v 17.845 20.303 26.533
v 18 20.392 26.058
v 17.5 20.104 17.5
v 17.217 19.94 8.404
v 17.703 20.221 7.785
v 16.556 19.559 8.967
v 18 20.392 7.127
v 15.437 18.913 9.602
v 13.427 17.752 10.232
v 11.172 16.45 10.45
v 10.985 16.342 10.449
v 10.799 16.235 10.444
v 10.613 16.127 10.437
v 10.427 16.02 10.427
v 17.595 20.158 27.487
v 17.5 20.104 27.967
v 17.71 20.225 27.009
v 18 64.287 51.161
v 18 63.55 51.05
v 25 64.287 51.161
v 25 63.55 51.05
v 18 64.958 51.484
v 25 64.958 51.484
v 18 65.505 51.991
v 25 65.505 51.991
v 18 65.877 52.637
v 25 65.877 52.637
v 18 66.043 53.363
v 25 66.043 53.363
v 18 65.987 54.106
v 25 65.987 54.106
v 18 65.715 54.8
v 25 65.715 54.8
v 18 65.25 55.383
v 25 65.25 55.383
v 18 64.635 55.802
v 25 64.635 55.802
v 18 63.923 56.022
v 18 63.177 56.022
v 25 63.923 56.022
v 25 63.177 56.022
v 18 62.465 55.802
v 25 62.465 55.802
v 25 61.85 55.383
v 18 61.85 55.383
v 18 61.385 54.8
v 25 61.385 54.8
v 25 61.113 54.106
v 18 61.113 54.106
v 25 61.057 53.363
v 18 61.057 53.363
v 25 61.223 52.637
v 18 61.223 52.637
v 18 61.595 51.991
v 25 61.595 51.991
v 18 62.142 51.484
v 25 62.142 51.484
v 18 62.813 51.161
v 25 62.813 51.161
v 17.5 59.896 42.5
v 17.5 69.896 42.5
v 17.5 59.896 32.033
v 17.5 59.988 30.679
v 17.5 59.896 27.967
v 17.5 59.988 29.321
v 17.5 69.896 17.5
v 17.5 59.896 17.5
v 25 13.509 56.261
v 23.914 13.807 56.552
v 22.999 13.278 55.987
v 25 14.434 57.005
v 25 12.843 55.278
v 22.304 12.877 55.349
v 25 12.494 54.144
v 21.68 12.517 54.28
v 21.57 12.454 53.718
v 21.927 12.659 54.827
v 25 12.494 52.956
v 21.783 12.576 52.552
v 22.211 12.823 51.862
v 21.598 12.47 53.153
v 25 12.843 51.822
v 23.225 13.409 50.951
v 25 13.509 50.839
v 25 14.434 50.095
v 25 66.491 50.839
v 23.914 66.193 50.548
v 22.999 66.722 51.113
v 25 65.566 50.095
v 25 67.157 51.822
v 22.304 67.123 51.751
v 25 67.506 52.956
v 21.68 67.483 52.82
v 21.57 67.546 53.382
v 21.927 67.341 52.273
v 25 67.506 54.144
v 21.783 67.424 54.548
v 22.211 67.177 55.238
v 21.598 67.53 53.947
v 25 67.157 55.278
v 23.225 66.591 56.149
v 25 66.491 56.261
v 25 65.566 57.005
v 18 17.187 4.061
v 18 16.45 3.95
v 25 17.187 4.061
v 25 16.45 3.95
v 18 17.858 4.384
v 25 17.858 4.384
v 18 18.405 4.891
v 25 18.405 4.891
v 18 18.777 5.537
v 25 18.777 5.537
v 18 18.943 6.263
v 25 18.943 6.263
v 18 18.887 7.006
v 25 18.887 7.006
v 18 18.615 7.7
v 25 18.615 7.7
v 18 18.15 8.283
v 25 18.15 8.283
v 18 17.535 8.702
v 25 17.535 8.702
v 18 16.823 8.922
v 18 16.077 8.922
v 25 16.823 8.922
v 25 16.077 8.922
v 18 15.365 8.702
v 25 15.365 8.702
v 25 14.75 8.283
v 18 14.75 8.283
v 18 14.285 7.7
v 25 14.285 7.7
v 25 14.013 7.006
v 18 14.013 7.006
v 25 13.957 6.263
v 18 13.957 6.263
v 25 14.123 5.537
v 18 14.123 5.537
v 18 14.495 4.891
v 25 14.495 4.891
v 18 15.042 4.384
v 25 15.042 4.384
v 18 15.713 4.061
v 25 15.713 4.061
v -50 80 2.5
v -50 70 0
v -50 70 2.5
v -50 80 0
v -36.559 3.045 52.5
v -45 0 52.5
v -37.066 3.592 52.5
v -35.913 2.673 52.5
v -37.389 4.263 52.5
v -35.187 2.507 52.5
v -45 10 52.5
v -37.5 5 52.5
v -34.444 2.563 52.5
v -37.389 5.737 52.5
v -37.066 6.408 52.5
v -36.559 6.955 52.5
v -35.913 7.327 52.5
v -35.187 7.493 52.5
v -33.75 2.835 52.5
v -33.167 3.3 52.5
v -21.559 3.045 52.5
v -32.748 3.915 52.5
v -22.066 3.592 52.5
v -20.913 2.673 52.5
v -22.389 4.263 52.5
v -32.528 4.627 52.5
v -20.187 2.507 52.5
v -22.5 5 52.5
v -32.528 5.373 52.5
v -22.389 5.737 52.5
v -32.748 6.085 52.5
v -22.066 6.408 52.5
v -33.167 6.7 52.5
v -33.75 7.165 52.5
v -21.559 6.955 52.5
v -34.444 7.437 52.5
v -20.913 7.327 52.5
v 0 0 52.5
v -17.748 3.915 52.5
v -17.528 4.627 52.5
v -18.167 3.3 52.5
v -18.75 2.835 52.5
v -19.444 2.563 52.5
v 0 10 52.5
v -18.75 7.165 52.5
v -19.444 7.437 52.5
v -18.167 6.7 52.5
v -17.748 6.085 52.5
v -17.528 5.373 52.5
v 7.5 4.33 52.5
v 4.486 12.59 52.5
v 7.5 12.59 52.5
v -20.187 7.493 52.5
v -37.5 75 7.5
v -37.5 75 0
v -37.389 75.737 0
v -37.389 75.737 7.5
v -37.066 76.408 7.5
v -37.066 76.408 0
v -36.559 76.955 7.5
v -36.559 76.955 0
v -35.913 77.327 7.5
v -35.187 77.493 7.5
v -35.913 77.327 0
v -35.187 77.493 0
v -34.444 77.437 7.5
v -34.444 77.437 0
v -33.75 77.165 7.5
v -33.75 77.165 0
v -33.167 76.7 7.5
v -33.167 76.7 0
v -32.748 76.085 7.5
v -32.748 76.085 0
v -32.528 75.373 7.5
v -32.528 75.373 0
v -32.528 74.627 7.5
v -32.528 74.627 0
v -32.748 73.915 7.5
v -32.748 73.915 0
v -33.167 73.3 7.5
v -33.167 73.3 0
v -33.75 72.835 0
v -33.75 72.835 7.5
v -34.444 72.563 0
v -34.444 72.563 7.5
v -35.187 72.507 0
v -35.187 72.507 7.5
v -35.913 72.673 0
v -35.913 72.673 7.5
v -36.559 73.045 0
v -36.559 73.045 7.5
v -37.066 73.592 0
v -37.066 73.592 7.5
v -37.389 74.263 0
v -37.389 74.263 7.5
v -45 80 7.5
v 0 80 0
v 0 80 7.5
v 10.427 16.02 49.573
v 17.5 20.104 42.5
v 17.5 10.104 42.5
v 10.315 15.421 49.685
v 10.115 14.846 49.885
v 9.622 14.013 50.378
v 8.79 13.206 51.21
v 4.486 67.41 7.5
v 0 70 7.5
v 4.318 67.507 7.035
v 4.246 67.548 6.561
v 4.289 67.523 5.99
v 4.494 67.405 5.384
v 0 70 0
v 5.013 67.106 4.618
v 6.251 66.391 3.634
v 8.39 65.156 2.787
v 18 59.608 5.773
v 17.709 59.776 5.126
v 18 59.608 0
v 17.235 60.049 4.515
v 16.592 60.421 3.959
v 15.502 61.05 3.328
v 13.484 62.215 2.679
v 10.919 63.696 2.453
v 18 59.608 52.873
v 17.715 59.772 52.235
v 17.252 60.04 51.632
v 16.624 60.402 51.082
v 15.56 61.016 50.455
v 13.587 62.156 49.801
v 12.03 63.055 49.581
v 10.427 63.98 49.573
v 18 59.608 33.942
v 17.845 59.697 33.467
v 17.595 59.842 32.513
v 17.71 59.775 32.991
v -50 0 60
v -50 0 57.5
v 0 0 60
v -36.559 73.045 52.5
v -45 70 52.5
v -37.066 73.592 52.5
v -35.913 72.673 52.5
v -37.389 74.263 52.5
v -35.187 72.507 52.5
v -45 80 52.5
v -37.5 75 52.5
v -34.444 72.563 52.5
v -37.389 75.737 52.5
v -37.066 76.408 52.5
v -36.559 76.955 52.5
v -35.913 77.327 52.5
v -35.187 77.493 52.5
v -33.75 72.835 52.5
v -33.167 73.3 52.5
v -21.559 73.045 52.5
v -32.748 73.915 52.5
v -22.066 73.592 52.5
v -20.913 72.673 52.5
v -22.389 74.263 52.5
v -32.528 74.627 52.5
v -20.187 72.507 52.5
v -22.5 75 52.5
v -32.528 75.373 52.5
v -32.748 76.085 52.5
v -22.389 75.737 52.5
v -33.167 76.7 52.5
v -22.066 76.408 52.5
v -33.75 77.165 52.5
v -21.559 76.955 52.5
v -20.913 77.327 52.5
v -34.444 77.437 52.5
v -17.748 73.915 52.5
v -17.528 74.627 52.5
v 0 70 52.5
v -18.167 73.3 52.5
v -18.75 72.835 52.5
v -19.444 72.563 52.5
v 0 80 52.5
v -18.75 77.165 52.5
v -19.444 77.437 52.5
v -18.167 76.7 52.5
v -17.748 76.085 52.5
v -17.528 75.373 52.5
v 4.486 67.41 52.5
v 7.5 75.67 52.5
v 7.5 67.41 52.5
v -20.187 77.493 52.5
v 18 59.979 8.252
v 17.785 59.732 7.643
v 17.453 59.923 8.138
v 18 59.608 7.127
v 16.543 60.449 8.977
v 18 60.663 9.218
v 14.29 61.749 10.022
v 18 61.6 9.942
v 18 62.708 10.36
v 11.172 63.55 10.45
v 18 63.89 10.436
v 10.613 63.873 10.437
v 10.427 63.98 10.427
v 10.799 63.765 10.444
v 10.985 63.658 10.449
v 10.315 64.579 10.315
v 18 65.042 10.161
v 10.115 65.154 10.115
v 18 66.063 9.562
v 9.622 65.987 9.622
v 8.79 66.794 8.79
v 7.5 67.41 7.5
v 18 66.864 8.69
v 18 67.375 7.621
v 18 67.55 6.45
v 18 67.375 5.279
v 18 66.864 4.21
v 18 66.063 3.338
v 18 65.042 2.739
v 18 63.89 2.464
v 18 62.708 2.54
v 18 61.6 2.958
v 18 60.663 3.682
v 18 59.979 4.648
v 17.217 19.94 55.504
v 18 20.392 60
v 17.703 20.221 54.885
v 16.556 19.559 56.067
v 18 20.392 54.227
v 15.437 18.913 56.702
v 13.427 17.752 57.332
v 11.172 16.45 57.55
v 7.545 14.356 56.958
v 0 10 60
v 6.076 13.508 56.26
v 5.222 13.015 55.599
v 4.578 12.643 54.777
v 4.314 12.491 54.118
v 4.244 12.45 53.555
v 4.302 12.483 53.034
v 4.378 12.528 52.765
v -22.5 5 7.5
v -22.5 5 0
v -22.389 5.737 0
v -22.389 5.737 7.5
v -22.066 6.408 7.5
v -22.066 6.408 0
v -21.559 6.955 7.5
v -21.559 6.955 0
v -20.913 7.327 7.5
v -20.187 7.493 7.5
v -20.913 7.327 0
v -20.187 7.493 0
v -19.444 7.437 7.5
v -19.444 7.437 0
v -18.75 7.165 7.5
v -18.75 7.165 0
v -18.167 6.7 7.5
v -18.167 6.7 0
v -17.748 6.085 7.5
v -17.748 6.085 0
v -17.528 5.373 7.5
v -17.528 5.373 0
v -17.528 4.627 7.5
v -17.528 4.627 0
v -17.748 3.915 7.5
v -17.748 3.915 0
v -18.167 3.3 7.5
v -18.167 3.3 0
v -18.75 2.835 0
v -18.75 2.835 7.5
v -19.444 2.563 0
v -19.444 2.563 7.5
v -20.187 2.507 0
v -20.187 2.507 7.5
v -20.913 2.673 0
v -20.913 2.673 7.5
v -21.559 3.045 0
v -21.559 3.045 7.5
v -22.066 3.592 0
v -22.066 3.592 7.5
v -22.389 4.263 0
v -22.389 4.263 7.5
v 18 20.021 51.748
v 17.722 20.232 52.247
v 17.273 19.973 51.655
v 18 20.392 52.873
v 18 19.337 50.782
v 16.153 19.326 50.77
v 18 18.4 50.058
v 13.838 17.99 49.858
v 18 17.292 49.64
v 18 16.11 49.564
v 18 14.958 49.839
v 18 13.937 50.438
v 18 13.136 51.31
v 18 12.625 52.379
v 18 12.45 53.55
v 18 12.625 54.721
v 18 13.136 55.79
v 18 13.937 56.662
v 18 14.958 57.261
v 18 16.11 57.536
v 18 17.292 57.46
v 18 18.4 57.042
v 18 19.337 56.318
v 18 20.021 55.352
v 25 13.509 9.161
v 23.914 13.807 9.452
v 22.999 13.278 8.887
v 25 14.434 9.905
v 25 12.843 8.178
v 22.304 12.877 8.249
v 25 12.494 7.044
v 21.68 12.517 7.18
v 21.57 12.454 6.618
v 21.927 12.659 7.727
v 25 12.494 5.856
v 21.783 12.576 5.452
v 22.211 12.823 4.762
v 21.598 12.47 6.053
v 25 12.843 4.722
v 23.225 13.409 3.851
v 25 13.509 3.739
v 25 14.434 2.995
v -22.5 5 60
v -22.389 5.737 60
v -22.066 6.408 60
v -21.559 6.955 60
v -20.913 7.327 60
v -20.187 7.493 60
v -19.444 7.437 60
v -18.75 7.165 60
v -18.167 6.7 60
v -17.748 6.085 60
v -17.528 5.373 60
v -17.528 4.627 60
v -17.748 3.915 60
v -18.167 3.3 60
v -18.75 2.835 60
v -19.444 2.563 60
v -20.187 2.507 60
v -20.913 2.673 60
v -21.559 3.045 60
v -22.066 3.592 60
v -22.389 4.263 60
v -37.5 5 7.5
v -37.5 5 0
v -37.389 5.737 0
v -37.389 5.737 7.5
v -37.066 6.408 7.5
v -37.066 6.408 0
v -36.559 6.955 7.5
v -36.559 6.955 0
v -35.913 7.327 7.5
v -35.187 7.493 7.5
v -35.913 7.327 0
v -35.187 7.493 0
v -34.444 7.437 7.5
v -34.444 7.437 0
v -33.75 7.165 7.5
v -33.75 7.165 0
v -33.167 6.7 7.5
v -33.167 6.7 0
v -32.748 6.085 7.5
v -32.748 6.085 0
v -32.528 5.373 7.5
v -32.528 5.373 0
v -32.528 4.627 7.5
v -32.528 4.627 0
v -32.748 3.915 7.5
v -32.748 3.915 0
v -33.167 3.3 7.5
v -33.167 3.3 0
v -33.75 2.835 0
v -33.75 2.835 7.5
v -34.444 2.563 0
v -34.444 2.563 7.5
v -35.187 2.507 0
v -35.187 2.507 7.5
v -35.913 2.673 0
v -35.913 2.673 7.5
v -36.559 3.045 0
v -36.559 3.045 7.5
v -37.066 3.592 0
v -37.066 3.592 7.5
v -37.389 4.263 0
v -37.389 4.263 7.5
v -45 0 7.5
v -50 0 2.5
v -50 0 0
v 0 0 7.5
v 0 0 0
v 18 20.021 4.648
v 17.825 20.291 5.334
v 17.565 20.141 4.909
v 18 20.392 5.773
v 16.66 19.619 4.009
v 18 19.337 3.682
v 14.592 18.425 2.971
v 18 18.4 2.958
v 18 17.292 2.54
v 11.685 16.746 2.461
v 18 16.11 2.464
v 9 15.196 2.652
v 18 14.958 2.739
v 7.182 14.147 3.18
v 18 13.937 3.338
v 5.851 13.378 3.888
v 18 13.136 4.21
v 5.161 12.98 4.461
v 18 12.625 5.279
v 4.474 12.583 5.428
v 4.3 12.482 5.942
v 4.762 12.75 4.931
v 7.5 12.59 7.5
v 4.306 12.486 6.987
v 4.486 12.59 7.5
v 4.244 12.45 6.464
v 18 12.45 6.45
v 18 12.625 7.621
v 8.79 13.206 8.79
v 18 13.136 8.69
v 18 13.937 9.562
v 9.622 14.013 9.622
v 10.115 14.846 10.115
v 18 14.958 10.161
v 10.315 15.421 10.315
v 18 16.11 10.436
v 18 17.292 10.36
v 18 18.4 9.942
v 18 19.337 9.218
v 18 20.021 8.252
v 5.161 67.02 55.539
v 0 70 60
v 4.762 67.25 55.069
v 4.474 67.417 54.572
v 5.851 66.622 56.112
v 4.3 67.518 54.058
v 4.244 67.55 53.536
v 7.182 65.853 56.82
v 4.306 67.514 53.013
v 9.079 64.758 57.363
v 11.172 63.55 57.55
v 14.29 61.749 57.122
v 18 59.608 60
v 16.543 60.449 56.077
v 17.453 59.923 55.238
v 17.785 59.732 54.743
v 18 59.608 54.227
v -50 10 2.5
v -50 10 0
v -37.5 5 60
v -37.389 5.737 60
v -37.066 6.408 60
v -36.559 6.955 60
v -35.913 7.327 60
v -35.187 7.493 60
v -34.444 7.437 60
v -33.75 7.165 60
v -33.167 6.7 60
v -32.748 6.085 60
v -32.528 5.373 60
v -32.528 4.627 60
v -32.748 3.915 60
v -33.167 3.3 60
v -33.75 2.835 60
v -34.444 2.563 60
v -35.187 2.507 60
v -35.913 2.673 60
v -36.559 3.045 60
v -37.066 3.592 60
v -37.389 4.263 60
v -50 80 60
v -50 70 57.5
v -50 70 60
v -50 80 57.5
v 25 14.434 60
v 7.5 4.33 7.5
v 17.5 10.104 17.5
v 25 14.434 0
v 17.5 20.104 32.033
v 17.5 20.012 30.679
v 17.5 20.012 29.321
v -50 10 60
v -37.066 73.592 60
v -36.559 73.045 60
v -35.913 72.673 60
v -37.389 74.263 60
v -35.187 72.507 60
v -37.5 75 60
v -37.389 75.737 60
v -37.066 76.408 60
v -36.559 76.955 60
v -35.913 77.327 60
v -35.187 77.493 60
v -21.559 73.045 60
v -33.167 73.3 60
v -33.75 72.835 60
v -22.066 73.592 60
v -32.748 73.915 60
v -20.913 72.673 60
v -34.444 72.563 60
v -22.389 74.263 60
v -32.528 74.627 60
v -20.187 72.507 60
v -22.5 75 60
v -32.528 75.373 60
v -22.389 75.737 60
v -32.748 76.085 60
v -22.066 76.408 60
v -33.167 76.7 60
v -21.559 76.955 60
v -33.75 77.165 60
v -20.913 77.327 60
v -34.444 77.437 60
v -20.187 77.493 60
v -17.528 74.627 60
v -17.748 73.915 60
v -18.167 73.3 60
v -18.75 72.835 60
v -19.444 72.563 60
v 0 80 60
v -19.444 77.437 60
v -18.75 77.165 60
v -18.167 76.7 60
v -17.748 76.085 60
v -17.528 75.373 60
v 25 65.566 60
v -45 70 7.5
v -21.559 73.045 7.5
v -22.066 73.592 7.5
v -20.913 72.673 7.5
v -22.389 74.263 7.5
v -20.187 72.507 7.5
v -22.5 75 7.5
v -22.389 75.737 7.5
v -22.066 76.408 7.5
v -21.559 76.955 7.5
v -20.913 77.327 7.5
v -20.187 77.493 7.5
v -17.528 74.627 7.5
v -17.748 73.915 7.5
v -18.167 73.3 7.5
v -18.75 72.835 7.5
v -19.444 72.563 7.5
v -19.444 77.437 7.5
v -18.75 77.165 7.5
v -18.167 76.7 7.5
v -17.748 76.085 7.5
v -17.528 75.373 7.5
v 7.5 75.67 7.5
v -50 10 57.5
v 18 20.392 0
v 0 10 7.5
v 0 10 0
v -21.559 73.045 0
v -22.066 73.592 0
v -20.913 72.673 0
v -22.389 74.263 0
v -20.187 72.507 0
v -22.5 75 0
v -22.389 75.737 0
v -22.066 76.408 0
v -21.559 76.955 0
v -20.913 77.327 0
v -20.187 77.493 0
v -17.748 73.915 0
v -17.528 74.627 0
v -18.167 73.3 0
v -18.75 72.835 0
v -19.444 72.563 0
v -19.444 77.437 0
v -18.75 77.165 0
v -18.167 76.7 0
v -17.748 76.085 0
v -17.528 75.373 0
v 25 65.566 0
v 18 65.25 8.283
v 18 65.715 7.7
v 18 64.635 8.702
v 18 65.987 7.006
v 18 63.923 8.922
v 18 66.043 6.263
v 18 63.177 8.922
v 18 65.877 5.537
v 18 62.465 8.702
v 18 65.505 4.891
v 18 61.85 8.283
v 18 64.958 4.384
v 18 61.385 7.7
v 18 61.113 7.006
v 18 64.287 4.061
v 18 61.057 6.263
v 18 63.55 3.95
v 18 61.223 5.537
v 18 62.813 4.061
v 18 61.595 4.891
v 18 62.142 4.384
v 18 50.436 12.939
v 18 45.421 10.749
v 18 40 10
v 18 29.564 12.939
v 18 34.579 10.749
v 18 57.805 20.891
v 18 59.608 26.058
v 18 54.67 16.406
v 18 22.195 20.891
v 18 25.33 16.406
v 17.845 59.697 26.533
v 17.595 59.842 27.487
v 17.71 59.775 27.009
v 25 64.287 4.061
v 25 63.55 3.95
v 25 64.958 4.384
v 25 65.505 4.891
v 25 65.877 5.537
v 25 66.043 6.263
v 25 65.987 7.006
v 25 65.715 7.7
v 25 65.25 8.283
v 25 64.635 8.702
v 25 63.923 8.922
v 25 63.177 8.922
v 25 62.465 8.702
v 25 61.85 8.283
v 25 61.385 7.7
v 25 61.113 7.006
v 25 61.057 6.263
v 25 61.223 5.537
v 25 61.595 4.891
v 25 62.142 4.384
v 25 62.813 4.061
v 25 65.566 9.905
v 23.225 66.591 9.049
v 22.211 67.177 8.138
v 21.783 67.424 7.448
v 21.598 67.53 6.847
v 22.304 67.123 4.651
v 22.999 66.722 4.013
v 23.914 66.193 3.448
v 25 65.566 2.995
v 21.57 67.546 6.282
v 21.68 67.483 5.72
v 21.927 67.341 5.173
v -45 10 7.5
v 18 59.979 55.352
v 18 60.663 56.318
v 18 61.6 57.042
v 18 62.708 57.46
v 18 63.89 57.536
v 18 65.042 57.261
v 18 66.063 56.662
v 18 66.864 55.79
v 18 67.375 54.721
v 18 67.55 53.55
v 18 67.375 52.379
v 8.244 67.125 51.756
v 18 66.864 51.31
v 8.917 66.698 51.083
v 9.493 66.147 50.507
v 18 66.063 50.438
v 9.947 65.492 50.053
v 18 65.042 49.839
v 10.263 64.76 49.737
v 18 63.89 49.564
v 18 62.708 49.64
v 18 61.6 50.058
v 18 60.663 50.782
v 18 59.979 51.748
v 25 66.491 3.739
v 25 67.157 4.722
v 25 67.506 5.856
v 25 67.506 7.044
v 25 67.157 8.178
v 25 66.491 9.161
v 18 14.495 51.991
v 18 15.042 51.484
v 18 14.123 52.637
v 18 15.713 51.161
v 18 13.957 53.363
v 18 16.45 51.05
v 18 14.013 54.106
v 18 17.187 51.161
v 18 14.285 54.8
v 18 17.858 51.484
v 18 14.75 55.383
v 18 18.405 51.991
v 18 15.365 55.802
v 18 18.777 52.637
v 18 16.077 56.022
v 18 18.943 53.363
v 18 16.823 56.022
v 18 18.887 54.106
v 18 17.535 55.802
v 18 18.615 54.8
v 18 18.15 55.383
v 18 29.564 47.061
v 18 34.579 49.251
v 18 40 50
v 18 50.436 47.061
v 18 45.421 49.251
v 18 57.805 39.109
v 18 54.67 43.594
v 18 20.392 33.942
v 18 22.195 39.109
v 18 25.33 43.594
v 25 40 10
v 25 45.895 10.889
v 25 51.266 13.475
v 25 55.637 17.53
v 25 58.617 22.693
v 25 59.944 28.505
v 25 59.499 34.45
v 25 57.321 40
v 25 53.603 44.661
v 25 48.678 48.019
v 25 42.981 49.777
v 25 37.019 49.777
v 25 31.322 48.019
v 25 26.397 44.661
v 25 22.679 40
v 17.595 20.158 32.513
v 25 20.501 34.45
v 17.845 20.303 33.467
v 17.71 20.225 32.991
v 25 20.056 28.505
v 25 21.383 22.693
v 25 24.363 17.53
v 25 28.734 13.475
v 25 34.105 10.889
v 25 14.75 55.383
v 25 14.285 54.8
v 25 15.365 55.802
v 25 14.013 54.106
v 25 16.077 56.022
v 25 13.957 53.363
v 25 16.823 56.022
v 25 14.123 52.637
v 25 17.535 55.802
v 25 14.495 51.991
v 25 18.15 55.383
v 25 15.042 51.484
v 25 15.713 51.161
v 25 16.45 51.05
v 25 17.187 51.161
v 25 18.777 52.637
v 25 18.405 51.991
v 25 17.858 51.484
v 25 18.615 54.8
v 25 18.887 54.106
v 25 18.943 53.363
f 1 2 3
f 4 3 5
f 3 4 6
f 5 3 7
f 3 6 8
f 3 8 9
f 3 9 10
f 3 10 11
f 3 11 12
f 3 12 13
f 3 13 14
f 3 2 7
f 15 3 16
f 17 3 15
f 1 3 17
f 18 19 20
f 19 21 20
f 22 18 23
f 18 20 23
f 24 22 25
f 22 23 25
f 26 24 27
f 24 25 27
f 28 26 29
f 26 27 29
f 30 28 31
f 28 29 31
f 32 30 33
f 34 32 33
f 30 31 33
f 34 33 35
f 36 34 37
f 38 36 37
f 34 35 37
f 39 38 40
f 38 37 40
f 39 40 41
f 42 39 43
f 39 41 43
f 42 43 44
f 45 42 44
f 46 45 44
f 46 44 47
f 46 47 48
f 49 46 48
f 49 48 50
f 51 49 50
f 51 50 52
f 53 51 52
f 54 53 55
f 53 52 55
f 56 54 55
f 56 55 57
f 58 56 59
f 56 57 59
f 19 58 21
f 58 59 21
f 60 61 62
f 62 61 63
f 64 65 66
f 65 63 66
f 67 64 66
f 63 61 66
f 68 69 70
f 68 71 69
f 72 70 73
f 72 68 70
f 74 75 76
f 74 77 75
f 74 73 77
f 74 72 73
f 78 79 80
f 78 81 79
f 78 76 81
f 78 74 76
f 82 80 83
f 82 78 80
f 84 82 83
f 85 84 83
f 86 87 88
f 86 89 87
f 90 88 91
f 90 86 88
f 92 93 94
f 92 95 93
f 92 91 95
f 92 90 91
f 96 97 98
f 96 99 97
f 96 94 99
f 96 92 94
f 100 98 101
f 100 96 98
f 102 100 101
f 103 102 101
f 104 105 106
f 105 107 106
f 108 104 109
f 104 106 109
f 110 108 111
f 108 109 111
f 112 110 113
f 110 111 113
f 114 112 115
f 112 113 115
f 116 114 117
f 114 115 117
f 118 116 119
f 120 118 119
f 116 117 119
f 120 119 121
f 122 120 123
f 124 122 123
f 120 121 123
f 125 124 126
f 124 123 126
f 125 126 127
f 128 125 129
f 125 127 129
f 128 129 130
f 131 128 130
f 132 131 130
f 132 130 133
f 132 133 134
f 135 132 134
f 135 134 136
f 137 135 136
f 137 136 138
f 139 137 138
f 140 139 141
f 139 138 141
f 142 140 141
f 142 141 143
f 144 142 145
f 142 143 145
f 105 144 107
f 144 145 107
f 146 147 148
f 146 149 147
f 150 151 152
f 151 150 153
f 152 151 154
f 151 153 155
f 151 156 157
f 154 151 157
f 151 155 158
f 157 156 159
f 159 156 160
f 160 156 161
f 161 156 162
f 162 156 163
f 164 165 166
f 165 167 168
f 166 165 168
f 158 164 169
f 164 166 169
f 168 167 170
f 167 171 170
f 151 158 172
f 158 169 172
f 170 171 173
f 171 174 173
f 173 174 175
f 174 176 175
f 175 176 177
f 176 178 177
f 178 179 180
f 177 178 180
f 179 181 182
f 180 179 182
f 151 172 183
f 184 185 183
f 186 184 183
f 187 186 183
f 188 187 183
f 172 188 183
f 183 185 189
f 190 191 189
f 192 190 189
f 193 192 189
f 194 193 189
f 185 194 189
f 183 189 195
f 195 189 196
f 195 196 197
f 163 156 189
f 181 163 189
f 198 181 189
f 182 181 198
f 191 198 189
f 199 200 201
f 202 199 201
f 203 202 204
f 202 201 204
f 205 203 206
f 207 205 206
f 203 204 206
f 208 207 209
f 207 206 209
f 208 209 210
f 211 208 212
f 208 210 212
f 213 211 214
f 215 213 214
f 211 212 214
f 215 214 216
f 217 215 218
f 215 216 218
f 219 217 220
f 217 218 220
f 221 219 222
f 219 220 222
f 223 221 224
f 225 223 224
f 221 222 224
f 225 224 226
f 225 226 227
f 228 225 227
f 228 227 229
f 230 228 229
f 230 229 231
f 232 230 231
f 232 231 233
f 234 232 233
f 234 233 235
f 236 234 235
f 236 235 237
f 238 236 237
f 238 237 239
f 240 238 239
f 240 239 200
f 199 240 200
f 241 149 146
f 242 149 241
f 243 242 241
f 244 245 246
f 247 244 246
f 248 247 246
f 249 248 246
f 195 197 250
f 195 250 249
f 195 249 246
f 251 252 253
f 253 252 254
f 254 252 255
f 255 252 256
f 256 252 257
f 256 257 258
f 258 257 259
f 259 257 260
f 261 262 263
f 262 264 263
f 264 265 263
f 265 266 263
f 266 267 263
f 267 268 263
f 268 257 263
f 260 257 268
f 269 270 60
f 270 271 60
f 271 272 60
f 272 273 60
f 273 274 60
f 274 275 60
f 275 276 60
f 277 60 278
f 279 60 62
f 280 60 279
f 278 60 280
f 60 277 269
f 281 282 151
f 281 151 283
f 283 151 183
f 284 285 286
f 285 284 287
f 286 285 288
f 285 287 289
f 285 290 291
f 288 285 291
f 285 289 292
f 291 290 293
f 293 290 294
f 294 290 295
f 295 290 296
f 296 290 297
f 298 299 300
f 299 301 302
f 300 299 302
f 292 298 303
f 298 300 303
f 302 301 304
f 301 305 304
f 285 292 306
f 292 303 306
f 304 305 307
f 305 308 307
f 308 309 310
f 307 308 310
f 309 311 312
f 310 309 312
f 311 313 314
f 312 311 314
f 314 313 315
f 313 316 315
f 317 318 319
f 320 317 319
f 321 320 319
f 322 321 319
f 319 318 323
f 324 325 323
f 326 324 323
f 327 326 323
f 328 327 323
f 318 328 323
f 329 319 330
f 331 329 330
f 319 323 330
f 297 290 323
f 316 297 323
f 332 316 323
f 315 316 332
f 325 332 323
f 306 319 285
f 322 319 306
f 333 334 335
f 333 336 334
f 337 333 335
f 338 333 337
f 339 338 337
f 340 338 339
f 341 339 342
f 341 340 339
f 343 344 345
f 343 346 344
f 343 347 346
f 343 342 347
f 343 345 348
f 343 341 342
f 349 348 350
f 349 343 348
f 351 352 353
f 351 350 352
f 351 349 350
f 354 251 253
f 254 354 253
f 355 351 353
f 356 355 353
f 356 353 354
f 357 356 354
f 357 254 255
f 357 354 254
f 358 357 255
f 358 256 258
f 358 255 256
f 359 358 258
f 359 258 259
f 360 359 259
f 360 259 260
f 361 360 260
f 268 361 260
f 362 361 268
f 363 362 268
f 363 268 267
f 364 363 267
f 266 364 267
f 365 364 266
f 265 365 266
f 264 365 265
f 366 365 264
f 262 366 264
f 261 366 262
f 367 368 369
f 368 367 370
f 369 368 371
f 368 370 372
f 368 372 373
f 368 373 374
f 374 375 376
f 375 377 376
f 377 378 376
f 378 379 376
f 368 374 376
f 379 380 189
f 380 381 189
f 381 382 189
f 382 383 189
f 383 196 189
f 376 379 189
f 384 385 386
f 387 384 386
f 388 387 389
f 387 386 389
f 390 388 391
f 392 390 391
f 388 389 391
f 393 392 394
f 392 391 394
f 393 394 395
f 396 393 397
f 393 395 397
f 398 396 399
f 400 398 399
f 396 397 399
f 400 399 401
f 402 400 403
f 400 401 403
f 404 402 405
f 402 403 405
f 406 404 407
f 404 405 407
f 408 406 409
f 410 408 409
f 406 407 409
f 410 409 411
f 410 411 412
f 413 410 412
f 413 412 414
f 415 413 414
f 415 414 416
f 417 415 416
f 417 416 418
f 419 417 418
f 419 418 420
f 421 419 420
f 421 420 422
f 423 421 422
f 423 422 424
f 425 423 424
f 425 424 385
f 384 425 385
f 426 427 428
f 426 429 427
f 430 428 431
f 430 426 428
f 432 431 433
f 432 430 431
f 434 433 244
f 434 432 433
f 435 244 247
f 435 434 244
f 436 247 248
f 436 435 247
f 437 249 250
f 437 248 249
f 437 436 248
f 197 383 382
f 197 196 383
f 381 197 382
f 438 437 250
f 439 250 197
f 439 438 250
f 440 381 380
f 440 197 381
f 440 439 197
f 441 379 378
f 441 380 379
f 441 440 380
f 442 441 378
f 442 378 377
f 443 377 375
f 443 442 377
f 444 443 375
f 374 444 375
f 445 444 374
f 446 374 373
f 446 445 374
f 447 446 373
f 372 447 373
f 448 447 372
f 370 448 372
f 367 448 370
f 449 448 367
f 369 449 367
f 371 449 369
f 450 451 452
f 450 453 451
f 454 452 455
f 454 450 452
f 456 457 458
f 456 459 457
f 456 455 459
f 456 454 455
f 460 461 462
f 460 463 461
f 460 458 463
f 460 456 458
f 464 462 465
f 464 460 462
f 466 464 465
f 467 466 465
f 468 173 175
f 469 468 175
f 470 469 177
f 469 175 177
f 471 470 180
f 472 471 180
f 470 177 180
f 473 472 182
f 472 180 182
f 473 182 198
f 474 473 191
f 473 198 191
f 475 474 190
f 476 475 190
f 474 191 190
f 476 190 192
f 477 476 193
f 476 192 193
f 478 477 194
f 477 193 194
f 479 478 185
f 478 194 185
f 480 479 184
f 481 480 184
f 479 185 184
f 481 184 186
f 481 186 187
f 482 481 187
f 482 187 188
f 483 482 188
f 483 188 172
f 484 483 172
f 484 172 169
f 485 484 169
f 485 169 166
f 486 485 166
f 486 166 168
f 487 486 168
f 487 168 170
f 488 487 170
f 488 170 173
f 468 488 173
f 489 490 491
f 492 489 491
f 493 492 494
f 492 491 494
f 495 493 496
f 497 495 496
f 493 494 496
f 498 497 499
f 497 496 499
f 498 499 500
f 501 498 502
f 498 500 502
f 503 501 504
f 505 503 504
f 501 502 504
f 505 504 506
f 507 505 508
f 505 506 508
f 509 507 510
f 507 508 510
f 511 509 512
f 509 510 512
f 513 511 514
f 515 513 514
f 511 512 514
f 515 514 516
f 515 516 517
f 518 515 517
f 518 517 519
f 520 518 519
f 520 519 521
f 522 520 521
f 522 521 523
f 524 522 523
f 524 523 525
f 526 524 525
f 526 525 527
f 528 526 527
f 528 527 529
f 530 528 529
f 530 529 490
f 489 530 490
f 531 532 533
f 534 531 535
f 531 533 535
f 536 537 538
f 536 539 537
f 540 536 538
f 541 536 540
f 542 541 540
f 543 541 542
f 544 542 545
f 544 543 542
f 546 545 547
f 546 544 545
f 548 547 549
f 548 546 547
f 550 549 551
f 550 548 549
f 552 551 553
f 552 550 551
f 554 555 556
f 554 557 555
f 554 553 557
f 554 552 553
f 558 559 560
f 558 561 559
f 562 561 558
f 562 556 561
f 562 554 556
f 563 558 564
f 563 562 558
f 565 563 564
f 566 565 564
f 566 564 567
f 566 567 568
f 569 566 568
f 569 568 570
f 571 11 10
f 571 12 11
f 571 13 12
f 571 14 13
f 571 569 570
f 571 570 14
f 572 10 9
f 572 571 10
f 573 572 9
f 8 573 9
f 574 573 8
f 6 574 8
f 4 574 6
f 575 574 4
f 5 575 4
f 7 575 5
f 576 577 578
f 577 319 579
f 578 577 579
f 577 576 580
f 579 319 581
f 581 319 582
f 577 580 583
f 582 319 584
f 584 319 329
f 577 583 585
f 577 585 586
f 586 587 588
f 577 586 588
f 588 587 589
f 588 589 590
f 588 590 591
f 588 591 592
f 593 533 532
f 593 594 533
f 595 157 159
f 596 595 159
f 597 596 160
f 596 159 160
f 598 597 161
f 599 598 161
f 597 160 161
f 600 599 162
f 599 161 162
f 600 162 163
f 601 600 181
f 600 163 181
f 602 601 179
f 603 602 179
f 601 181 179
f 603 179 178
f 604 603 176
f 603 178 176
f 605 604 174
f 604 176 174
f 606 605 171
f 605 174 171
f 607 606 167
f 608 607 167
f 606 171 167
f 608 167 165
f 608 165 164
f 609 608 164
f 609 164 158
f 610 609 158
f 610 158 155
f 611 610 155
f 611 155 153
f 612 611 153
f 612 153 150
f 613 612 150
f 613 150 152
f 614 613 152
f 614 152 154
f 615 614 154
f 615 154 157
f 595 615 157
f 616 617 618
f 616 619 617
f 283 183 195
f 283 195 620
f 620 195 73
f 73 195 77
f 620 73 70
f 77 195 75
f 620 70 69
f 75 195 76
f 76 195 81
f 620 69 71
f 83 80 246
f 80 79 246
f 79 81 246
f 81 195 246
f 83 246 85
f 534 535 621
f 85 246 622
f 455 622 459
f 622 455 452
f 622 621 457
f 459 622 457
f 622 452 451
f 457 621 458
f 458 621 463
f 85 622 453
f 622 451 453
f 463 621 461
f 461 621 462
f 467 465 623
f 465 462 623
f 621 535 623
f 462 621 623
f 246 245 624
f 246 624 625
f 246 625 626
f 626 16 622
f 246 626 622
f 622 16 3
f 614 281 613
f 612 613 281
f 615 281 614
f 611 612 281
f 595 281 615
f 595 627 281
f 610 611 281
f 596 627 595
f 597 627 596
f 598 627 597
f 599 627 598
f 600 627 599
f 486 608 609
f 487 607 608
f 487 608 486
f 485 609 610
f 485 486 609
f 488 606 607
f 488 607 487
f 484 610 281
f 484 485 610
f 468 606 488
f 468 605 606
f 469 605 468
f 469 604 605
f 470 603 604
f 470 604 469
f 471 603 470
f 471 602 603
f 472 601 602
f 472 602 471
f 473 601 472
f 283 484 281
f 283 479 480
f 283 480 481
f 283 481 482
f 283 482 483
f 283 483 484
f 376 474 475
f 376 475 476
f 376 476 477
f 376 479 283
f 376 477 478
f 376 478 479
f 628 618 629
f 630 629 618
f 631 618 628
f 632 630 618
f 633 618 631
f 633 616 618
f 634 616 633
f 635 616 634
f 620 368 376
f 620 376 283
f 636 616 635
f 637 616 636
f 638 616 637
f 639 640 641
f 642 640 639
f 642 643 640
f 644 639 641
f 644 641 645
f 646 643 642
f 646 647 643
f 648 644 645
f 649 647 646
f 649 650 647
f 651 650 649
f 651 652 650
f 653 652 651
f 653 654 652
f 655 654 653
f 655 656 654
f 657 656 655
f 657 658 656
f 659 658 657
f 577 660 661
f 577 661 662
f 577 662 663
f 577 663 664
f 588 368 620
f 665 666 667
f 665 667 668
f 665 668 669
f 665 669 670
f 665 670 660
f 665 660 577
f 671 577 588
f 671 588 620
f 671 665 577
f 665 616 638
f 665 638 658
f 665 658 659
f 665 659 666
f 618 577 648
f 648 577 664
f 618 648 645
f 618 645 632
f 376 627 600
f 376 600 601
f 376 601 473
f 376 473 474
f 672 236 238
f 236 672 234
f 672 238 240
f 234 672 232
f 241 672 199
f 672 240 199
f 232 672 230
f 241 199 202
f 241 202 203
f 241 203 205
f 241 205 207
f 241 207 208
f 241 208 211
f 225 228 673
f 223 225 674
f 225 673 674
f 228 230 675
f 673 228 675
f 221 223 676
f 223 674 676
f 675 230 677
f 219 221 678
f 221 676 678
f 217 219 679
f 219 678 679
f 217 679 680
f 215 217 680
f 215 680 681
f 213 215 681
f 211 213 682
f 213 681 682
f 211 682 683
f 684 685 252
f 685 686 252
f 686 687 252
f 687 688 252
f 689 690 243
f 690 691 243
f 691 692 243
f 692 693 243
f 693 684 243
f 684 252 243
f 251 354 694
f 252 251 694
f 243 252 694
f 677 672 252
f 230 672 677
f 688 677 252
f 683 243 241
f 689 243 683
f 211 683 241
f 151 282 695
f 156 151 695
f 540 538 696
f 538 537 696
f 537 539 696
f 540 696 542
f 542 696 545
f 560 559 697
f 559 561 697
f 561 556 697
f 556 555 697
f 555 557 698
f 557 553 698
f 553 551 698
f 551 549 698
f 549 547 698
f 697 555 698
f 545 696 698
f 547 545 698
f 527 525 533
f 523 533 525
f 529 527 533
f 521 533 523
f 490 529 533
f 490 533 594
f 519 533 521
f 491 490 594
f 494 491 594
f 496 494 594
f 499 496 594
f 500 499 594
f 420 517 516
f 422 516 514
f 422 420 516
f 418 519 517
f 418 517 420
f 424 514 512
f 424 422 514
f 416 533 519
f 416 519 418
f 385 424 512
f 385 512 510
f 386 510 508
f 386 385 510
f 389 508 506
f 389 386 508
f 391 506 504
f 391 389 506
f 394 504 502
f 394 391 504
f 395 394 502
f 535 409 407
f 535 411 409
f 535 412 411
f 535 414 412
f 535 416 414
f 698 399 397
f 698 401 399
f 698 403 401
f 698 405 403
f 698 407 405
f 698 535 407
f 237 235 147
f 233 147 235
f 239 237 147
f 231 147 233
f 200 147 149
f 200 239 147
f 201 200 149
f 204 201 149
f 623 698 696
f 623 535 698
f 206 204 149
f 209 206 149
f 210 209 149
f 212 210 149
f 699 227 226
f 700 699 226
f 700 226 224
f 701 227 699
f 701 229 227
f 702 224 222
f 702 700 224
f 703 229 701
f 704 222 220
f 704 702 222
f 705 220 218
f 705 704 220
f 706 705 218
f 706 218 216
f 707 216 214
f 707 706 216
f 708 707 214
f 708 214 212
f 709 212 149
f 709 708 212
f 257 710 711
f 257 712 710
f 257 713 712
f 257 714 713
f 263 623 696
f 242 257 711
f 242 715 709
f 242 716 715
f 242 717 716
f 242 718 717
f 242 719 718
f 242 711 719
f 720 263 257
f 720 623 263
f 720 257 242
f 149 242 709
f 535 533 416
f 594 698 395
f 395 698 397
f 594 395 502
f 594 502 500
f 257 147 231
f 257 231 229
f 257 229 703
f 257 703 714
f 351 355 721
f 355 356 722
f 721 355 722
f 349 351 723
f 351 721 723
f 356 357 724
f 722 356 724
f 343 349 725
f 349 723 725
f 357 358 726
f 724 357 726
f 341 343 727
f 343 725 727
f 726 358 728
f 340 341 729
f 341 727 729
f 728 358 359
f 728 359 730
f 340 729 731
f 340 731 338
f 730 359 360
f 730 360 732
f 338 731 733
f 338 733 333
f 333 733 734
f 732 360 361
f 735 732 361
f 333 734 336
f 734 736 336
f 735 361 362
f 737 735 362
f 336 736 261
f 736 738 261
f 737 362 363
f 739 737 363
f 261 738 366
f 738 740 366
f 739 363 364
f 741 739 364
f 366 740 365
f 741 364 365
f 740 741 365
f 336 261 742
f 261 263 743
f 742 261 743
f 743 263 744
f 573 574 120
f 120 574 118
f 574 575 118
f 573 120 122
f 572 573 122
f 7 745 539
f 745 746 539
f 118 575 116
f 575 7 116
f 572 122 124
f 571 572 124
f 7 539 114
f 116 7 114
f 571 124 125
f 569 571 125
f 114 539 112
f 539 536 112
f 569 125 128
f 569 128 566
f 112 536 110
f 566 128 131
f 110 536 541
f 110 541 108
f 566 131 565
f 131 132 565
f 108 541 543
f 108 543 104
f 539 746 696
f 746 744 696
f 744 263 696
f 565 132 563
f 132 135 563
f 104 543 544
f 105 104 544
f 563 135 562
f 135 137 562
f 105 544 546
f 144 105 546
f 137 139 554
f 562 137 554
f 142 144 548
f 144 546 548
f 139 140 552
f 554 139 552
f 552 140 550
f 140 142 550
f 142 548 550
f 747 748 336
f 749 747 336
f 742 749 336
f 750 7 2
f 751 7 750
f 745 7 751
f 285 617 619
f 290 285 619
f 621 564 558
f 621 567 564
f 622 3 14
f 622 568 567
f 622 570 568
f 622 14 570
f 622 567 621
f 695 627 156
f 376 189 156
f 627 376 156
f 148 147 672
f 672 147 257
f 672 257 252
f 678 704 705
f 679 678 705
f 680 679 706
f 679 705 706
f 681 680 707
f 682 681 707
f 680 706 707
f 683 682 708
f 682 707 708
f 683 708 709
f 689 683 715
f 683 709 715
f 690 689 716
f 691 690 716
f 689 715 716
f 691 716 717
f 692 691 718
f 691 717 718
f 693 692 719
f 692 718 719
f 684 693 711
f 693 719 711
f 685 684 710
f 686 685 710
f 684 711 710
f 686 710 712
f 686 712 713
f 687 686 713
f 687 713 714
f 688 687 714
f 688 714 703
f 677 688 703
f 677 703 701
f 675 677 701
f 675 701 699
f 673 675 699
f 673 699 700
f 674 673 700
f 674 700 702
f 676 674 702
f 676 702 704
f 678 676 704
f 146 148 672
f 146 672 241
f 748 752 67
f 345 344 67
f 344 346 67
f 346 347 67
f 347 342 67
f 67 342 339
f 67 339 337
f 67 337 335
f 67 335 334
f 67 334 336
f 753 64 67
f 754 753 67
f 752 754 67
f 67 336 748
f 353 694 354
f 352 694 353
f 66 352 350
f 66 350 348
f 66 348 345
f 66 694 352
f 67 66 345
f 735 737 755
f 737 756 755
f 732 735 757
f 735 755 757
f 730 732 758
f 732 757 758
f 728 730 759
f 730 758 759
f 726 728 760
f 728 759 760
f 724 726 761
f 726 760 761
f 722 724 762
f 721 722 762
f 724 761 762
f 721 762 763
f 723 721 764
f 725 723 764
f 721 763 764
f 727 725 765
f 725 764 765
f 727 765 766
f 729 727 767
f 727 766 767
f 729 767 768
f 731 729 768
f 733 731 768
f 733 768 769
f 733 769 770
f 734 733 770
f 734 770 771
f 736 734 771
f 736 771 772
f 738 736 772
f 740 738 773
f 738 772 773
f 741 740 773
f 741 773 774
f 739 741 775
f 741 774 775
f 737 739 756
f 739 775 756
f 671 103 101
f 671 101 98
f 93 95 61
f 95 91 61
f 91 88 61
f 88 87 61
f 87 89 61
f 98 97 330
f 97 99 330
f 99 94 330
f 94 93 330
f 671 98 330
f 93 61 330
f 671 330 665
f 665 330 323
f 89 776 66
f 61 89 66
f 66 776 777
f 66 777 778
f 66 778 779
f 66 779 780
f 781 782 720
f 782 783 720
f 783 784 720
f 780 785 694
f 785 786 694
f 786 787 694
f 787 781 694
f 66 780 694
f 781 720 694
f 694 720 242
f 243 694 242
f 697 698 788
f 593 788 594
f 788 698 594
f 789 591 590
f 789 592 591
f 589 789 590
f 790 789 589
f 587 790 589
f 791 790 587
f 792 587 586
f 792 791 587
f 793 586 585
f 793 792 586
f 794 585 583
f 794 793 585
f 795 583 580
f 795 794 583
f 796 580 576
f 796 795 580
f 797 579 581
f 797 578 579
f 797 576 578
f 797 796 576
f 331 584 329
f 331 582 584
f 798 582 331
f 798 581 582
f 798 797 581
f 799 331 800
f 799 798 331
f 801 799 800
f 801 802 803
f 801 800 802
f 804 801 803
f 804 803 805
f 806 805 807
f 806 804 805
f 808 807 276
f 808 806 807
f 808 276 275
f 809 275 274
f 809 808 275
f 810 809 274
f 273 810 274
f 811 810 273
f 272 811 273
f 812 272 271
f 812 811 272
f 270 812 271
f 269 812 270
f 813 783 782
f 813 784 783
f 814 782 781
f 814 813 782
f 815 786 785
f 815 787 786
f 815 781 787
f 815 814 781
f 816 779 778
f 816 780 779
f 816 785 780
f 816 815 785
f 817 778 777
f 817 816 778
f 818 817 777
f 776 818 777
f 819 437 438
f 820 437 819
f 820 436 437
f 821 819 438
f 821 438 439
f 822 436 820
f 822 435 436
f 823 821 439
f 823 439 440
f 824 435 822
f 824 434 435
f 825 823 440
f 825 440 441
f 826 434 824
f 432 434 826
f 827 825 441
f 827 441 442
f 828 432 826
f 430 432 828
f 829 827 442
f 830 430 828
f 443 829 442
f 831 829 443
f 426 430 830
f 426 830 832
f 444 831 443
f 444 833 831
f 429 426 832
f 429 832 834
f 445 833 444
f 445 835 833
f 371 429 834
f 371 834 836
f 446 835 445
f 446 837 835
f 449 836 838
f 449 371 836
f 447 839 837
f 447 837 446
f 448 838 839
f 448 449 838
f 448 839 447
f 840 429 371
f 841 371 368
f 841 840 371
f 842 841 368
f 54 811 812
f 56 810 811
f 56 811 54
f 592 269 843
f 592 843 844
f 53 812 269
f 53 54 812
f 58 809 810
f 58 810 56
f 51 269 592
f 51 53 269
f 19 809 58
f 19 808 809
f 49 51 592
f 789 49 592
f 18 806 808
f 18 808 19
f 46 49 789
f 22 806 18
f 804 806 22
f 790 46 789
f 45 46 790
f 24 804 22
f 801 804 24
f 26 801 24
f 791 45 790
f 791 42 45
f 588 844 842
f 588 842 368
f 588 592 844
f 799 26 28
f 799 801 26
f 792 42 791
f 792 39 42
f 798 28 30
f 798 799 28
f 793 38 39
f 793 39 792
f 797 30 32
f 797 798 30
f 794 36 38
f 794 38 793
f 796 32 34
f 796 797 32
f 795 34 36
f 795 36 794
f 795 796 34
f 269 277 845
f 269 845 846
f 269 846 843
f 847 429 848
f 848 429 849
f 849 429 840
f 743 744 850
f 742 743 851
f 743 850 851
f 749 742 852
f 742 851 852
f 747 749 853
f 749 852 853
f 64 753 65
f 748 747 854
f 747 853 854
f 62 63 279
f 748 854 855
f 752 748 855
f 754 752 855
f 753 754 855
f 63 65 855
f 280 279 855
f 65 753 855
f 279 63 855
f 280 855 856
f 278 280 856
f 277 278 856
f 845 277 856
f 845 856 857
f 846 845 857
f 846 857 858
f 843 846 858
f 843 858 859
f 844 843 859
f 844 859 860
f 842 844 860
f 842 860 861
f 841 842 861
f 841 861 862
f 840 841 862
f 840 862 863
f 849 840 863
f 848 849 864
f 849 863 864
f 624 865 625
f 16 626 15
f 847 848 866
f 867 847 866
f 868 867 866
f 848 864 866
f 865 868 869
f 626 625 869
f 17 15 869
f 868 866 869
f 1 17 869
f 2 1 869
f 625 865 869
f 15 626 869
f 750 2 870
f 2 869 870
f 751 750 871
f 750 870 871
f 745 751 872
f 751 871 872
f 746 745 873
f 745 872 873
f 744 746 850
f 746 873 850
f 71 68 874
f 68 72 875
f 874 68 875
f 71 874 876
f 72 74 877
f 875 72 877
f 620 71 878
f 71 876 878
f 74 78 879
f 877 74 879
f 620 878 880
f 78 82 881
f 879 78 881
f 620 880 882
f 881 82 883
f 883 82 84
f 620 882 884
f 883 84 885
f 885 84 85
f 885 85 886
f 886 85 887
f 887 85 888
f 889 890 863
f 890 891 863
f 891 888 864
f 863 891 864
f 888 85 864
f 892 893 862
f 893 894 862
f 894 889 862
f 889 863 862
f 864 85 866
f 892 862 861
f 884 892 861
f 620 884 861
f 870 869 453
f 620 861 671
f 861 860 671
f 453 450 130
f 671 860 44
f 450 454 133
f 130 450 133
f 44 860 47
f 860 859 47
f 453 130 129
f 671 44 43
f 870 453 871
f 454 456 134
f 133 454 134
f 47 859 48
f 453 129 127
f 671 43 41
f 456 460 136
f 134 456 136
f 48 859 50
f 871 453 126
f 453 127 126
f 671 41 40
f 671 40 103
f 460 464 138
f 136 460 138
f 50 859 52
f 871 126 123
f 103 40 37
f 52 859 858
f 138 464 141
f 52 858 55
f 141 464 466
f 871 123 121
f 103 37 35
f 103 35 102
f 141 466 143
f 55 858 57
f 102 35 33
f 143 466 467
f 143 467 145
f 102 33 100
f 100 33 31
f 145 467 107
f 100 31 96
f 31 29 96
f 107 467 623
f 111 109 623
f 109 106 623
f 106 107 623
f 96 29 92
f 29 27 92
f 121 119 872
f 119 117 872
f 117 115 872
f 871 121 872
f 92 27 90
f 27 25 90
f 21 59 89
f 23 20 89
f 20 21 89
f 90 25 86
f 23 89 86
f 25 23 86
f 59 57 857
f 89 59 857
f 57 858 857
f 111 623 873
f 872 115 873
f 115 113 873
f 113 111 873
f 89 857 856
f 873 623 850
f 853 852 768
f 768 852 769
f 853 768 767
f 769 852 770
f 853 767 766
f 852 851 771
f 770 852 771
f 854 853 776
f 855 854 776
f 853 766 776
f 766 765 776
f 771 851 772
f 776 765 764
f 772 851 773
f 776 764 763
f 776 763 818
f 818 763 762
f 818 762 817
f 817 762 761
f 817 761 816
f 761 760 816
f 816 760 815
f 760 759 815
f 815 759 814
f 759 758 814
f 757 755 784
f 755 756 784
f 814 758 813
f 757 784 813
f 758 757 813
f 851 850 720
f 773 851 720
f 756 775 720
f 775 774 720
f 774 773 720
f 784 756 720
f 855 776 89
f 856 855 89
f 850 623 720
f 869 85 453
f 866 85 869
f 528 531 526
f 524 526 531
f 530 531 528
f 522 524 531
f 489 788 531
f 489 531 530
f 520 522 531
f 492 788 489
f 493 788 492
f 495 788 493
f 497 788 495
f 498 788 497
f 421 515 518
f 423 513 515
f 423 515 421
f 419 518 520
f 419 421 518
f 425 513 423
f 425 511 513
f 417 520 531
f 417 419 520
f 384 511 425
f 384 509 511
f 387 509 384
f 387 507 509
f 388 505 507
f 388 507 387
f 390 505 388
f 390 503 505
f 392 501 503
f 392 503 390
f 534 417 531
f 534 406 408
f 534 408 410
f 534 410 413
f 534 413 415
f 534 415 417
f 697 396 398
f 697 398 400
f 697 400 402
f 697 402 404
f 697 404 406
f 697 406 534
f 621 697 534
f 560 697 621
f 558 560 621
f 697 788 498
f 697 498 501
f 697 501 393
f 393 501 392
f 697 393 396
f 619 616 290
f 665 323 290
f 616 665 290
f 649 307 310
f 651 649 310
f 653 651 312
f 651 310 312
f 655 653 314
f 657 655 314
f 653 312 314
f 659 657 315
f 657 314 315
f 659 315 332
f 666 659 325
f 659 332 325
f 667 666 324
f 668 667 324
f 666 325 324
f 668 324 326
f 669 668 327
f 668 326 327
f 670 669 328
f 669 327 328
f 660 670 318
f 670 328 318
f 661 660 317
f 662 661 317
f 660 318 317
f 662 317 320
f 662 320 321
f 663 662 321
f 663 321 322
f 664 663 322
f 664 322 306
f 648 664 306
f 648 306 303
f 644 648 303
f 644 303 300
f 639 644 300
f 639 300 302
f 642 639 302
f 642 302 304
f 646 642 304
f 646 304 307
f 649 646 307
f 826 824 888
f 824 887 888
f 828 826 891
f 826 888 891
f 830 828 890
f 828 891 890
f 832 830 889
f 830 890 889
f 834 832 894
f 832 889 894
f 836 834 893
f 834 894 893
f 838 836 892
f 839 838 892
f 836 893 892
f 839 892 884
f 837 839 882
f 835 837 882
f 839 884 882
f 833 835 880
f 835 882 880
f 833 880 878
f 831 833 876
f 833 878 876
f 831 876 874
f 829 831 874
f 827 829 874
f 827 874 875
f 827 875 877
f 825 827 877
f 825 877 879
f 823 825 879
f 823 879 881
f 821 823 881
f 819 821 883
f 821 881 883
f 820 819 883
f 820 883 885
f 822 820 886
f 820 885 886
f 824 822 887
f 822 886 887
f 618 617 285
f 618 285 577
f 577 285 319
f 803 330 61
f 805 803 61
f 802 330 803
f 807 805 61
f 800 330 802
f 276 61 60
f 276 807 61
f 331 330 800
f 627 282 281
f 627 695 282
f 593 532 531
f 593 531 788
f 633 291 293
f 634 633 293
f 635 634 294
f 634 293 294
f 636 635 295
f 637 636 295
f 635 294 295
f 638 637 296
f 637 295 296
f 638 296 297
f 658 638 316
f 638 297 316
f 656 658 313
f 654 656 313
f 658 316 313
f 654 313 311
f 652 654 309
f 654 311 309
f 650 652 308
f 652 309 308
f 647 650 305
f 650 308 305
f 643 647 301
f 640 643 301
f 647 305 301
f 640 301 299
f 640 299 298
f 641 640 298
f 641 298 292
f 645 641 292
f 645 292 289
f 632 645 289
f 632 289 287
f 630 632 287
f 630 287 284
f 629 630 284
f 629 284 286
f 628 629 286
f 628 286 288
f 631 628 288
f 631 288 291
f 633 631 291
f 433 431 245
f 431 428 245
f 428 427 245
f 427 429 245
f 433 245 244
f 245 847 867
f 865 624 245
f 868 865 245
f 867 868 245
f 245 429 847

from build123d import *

# Parameters (mm, degrees)
BOSS_EXTRUDE1_DEPTH = 60
SKETCH2_W           = 115
SKETCH2_H           = 45
CUT_EXTRUDE1_DEPTH  = 81
SKETCH3_W           = 7.5
SKETCH3_H           = 10
BOSS_EXTRUDE2_DEPTH = 10
CHAMFER1_SIZE       = 5
SKETCH4_R           = 2.5
CUT_EXTRUDE2_DEPTH  = 61
CHAMFER2_SIZE       = 10
SKETCH5_R           = 20
CUT_EXTRUDE3_DEPTH  = 76
SKETCH6_R           = 2.5
CUT_EXTRUDE4_DEPTH  = 76
SKETCH7_R           = 4
SKETCH7_R_2         = 2.5
BOSS_EXTRUDE3_DEPTH = 5
SKETCH8_R           = 4
CUT_EXTRUDE5_DEPTH  = 69


with BuildPart() as part:
    # Sketch1 → Boss-Extrude1 (new body)
    with BuildSketch(Plane.XY):
        Polygon((0, 0), (25, 14.43375673), (25, 65.56624327), (0, 80), (-40, 80), (-40, 70), (0, 70), (18, 59.607695155), (18, 20.392304845), (0, 10), (-40, 10), (-40, 0), align=None)
    extrude(amount=BOSS_EXTRUDE1_DEPTH)

    # Sketch2 → Cut-Extrude1 (cut, through all)
    with BuildSketch(Plane(origin=(0, 80, 0), x_dir=(1, 0, 0), z_dir=(0, 1, 0))):
        with Locations((-40, -30)):
            Rectangle(SKETCH2_W, SKETCH2_H)
    extrude(amount=-CUT_EXTRUDE1_DEPTH, mode=Mode.SUBTRACT)

    # Sketch3 → Boss-Extrude2 (add)
    with BuildSketch(Plane.ZY.offset(40)):
        with Locations((3.75, 75)):
            Rectangle(SKETCH3_W, SKETCH3_H)
        with Locations((56.25, 75)):
            Rectangle(SKETCH3_W, SKETCH3_H)
        with Locations((56.25, 5)):
            Rectangle(SKETCH3_W, SKETCH3_H)
        with Locations((3.75, 5)):
            Rectangle(SKETCH3_W, SKETCH3_H)
    extrude(amount=BOSS_EXTRUDE2_DEPTH)

    # Chamfer1
    chamfer1_edges = [part.edges().sort_by_distance(p)[0] for p in [
        (-50, 5, 52.5),
        (-50, 5, 7.5),
        (-50, 75, 7.5),
        (-50, 75, 52.5),
    ]]
    chamfer(chamfer1_edges, length=CHAMFER1_SIZE)

    # Sketch4 → Cut-Extrude2 (cut, through all)
    with BuildSketch(Plane(origin=(0, 0, 0), x_dir=(-1, 0, 0), z_dir=(0, 0, -1))):
        with Locations((20, 75)):
            Circle(SKETCH4_R)
        with Locations((35, 75)):
            Circle(SKETCH4_R)
        with Locations((35, 5)):
            Circle(SKETCH4_R)
        with Locations((20, 5)):
            Circle(SKETCH4_R)
    extrude(amount=-CUT_EXTRUDE2_DEPTH, mode=Mode.SUBTRACT)

    # Chamfer2
    chamfer2_edges = [part.edges().sort_by_distance(p)[0] for p in [
        (17.5, 15.103629711, 7.5),
        (17.5, 64.896370289, 7.5),
        (17.5, 15.103629711, 52.5),
        (17.5, 64.896370289, 52.5),
    ]]
    chamfer(chamfer2_edges, length=CHAMFER2_SIZE)

    # Sketch5 → Cut-Extrude3 (cut, through all)
    with BuildSketch(Plane(origin=(25, 0, 0), x_dir=(0, 0, -1), z_dir=(1, 0, 0))):
        with Locations((-30, 40)):
            Circle(SKETCH5_R)
    extrude(amount=-CUT_EXTRUDE3_DEPTH, mode=Mode.SUBTRACT)

    # Sketch6 → Cut-Extrude4 (cut, through all)
    with BuildSketch(Plane(origin=(25, 0, 0), x_dir=(0, 0, -1), z_dir=(1, 0, 0))):
        with Locations((-53.55, 63.55)):
            Circle(SKETCH6_R)
        with Locations((-6.45, 63.55)):
            Circle(SKETCH6_R)
        with Locations((-6.45, 16.45)):
            Circle(SKETCH6_R)
        with Locations((-53.55, 16.45)):
            Circle(SKETCH6_R)
    extrude(amount=-CUT_EXTRUDE4_DEPTH, mode=Mode.SUBTRACT)

    # Sketch7 → Boss-Extrude3 (add)
    with BuildSketch(Plane(origin=(25, 0, 0), x_dir=(0, 0, -1), z_dir=(1, 0, 0))):
        with Locations((-53.55, 63.55)):
            Circle(SKETCH7_R)
        with Locations((-53.55, 63.55)):
            Circle(SKETCH7_R_2, mode=Mode.SUBTRACT)
        with Locations((-6.45, 63.55)):
            Circle(SKETCH7_R)
        with Locations((-6.45, 63.55)):
            Circle(SKETCH7_R_2, mode=Mode.SUBTRACT)
        with Locations((-6.45, 16.45)):
            Circle(SKETCH7_R)
        with Locations((-6.45, 16.45)):
            Circle(SKETCH7_R_2, mode=Mode.SUBTRACT)
        with Locations((-53.55, 16.45)):
            Circle(SKETCH7_R)
        with Locations((-53.55, 16.45)):
            Circle(SKETCH7_R_2, mode=Mode.SUBTRACT)
    extrude(amount=-BOSS_EXTRUDE3_DEPTH)

    # Sketch8 → Cut-Extrude5 (cut, through all)
    with BuildSketch(Plane.ZY.offset(-18)):
        with Locations((6.45, 63.55)):
            Circle(SKETCH8_R)
        with Locations((53.55, 63.55)):
            Circle(SKETCH8_R)
        with Locations((53.55, 16.45)):
            Circle(SKETCH8_R)
        with Locations((6.45, 16.45)):
            Circle(SKETCH8_R)
    extrude(amount=CUT_EXTRUDE5_DEPTH, mode=Mode.SUBTRACT)


solid = part.part
